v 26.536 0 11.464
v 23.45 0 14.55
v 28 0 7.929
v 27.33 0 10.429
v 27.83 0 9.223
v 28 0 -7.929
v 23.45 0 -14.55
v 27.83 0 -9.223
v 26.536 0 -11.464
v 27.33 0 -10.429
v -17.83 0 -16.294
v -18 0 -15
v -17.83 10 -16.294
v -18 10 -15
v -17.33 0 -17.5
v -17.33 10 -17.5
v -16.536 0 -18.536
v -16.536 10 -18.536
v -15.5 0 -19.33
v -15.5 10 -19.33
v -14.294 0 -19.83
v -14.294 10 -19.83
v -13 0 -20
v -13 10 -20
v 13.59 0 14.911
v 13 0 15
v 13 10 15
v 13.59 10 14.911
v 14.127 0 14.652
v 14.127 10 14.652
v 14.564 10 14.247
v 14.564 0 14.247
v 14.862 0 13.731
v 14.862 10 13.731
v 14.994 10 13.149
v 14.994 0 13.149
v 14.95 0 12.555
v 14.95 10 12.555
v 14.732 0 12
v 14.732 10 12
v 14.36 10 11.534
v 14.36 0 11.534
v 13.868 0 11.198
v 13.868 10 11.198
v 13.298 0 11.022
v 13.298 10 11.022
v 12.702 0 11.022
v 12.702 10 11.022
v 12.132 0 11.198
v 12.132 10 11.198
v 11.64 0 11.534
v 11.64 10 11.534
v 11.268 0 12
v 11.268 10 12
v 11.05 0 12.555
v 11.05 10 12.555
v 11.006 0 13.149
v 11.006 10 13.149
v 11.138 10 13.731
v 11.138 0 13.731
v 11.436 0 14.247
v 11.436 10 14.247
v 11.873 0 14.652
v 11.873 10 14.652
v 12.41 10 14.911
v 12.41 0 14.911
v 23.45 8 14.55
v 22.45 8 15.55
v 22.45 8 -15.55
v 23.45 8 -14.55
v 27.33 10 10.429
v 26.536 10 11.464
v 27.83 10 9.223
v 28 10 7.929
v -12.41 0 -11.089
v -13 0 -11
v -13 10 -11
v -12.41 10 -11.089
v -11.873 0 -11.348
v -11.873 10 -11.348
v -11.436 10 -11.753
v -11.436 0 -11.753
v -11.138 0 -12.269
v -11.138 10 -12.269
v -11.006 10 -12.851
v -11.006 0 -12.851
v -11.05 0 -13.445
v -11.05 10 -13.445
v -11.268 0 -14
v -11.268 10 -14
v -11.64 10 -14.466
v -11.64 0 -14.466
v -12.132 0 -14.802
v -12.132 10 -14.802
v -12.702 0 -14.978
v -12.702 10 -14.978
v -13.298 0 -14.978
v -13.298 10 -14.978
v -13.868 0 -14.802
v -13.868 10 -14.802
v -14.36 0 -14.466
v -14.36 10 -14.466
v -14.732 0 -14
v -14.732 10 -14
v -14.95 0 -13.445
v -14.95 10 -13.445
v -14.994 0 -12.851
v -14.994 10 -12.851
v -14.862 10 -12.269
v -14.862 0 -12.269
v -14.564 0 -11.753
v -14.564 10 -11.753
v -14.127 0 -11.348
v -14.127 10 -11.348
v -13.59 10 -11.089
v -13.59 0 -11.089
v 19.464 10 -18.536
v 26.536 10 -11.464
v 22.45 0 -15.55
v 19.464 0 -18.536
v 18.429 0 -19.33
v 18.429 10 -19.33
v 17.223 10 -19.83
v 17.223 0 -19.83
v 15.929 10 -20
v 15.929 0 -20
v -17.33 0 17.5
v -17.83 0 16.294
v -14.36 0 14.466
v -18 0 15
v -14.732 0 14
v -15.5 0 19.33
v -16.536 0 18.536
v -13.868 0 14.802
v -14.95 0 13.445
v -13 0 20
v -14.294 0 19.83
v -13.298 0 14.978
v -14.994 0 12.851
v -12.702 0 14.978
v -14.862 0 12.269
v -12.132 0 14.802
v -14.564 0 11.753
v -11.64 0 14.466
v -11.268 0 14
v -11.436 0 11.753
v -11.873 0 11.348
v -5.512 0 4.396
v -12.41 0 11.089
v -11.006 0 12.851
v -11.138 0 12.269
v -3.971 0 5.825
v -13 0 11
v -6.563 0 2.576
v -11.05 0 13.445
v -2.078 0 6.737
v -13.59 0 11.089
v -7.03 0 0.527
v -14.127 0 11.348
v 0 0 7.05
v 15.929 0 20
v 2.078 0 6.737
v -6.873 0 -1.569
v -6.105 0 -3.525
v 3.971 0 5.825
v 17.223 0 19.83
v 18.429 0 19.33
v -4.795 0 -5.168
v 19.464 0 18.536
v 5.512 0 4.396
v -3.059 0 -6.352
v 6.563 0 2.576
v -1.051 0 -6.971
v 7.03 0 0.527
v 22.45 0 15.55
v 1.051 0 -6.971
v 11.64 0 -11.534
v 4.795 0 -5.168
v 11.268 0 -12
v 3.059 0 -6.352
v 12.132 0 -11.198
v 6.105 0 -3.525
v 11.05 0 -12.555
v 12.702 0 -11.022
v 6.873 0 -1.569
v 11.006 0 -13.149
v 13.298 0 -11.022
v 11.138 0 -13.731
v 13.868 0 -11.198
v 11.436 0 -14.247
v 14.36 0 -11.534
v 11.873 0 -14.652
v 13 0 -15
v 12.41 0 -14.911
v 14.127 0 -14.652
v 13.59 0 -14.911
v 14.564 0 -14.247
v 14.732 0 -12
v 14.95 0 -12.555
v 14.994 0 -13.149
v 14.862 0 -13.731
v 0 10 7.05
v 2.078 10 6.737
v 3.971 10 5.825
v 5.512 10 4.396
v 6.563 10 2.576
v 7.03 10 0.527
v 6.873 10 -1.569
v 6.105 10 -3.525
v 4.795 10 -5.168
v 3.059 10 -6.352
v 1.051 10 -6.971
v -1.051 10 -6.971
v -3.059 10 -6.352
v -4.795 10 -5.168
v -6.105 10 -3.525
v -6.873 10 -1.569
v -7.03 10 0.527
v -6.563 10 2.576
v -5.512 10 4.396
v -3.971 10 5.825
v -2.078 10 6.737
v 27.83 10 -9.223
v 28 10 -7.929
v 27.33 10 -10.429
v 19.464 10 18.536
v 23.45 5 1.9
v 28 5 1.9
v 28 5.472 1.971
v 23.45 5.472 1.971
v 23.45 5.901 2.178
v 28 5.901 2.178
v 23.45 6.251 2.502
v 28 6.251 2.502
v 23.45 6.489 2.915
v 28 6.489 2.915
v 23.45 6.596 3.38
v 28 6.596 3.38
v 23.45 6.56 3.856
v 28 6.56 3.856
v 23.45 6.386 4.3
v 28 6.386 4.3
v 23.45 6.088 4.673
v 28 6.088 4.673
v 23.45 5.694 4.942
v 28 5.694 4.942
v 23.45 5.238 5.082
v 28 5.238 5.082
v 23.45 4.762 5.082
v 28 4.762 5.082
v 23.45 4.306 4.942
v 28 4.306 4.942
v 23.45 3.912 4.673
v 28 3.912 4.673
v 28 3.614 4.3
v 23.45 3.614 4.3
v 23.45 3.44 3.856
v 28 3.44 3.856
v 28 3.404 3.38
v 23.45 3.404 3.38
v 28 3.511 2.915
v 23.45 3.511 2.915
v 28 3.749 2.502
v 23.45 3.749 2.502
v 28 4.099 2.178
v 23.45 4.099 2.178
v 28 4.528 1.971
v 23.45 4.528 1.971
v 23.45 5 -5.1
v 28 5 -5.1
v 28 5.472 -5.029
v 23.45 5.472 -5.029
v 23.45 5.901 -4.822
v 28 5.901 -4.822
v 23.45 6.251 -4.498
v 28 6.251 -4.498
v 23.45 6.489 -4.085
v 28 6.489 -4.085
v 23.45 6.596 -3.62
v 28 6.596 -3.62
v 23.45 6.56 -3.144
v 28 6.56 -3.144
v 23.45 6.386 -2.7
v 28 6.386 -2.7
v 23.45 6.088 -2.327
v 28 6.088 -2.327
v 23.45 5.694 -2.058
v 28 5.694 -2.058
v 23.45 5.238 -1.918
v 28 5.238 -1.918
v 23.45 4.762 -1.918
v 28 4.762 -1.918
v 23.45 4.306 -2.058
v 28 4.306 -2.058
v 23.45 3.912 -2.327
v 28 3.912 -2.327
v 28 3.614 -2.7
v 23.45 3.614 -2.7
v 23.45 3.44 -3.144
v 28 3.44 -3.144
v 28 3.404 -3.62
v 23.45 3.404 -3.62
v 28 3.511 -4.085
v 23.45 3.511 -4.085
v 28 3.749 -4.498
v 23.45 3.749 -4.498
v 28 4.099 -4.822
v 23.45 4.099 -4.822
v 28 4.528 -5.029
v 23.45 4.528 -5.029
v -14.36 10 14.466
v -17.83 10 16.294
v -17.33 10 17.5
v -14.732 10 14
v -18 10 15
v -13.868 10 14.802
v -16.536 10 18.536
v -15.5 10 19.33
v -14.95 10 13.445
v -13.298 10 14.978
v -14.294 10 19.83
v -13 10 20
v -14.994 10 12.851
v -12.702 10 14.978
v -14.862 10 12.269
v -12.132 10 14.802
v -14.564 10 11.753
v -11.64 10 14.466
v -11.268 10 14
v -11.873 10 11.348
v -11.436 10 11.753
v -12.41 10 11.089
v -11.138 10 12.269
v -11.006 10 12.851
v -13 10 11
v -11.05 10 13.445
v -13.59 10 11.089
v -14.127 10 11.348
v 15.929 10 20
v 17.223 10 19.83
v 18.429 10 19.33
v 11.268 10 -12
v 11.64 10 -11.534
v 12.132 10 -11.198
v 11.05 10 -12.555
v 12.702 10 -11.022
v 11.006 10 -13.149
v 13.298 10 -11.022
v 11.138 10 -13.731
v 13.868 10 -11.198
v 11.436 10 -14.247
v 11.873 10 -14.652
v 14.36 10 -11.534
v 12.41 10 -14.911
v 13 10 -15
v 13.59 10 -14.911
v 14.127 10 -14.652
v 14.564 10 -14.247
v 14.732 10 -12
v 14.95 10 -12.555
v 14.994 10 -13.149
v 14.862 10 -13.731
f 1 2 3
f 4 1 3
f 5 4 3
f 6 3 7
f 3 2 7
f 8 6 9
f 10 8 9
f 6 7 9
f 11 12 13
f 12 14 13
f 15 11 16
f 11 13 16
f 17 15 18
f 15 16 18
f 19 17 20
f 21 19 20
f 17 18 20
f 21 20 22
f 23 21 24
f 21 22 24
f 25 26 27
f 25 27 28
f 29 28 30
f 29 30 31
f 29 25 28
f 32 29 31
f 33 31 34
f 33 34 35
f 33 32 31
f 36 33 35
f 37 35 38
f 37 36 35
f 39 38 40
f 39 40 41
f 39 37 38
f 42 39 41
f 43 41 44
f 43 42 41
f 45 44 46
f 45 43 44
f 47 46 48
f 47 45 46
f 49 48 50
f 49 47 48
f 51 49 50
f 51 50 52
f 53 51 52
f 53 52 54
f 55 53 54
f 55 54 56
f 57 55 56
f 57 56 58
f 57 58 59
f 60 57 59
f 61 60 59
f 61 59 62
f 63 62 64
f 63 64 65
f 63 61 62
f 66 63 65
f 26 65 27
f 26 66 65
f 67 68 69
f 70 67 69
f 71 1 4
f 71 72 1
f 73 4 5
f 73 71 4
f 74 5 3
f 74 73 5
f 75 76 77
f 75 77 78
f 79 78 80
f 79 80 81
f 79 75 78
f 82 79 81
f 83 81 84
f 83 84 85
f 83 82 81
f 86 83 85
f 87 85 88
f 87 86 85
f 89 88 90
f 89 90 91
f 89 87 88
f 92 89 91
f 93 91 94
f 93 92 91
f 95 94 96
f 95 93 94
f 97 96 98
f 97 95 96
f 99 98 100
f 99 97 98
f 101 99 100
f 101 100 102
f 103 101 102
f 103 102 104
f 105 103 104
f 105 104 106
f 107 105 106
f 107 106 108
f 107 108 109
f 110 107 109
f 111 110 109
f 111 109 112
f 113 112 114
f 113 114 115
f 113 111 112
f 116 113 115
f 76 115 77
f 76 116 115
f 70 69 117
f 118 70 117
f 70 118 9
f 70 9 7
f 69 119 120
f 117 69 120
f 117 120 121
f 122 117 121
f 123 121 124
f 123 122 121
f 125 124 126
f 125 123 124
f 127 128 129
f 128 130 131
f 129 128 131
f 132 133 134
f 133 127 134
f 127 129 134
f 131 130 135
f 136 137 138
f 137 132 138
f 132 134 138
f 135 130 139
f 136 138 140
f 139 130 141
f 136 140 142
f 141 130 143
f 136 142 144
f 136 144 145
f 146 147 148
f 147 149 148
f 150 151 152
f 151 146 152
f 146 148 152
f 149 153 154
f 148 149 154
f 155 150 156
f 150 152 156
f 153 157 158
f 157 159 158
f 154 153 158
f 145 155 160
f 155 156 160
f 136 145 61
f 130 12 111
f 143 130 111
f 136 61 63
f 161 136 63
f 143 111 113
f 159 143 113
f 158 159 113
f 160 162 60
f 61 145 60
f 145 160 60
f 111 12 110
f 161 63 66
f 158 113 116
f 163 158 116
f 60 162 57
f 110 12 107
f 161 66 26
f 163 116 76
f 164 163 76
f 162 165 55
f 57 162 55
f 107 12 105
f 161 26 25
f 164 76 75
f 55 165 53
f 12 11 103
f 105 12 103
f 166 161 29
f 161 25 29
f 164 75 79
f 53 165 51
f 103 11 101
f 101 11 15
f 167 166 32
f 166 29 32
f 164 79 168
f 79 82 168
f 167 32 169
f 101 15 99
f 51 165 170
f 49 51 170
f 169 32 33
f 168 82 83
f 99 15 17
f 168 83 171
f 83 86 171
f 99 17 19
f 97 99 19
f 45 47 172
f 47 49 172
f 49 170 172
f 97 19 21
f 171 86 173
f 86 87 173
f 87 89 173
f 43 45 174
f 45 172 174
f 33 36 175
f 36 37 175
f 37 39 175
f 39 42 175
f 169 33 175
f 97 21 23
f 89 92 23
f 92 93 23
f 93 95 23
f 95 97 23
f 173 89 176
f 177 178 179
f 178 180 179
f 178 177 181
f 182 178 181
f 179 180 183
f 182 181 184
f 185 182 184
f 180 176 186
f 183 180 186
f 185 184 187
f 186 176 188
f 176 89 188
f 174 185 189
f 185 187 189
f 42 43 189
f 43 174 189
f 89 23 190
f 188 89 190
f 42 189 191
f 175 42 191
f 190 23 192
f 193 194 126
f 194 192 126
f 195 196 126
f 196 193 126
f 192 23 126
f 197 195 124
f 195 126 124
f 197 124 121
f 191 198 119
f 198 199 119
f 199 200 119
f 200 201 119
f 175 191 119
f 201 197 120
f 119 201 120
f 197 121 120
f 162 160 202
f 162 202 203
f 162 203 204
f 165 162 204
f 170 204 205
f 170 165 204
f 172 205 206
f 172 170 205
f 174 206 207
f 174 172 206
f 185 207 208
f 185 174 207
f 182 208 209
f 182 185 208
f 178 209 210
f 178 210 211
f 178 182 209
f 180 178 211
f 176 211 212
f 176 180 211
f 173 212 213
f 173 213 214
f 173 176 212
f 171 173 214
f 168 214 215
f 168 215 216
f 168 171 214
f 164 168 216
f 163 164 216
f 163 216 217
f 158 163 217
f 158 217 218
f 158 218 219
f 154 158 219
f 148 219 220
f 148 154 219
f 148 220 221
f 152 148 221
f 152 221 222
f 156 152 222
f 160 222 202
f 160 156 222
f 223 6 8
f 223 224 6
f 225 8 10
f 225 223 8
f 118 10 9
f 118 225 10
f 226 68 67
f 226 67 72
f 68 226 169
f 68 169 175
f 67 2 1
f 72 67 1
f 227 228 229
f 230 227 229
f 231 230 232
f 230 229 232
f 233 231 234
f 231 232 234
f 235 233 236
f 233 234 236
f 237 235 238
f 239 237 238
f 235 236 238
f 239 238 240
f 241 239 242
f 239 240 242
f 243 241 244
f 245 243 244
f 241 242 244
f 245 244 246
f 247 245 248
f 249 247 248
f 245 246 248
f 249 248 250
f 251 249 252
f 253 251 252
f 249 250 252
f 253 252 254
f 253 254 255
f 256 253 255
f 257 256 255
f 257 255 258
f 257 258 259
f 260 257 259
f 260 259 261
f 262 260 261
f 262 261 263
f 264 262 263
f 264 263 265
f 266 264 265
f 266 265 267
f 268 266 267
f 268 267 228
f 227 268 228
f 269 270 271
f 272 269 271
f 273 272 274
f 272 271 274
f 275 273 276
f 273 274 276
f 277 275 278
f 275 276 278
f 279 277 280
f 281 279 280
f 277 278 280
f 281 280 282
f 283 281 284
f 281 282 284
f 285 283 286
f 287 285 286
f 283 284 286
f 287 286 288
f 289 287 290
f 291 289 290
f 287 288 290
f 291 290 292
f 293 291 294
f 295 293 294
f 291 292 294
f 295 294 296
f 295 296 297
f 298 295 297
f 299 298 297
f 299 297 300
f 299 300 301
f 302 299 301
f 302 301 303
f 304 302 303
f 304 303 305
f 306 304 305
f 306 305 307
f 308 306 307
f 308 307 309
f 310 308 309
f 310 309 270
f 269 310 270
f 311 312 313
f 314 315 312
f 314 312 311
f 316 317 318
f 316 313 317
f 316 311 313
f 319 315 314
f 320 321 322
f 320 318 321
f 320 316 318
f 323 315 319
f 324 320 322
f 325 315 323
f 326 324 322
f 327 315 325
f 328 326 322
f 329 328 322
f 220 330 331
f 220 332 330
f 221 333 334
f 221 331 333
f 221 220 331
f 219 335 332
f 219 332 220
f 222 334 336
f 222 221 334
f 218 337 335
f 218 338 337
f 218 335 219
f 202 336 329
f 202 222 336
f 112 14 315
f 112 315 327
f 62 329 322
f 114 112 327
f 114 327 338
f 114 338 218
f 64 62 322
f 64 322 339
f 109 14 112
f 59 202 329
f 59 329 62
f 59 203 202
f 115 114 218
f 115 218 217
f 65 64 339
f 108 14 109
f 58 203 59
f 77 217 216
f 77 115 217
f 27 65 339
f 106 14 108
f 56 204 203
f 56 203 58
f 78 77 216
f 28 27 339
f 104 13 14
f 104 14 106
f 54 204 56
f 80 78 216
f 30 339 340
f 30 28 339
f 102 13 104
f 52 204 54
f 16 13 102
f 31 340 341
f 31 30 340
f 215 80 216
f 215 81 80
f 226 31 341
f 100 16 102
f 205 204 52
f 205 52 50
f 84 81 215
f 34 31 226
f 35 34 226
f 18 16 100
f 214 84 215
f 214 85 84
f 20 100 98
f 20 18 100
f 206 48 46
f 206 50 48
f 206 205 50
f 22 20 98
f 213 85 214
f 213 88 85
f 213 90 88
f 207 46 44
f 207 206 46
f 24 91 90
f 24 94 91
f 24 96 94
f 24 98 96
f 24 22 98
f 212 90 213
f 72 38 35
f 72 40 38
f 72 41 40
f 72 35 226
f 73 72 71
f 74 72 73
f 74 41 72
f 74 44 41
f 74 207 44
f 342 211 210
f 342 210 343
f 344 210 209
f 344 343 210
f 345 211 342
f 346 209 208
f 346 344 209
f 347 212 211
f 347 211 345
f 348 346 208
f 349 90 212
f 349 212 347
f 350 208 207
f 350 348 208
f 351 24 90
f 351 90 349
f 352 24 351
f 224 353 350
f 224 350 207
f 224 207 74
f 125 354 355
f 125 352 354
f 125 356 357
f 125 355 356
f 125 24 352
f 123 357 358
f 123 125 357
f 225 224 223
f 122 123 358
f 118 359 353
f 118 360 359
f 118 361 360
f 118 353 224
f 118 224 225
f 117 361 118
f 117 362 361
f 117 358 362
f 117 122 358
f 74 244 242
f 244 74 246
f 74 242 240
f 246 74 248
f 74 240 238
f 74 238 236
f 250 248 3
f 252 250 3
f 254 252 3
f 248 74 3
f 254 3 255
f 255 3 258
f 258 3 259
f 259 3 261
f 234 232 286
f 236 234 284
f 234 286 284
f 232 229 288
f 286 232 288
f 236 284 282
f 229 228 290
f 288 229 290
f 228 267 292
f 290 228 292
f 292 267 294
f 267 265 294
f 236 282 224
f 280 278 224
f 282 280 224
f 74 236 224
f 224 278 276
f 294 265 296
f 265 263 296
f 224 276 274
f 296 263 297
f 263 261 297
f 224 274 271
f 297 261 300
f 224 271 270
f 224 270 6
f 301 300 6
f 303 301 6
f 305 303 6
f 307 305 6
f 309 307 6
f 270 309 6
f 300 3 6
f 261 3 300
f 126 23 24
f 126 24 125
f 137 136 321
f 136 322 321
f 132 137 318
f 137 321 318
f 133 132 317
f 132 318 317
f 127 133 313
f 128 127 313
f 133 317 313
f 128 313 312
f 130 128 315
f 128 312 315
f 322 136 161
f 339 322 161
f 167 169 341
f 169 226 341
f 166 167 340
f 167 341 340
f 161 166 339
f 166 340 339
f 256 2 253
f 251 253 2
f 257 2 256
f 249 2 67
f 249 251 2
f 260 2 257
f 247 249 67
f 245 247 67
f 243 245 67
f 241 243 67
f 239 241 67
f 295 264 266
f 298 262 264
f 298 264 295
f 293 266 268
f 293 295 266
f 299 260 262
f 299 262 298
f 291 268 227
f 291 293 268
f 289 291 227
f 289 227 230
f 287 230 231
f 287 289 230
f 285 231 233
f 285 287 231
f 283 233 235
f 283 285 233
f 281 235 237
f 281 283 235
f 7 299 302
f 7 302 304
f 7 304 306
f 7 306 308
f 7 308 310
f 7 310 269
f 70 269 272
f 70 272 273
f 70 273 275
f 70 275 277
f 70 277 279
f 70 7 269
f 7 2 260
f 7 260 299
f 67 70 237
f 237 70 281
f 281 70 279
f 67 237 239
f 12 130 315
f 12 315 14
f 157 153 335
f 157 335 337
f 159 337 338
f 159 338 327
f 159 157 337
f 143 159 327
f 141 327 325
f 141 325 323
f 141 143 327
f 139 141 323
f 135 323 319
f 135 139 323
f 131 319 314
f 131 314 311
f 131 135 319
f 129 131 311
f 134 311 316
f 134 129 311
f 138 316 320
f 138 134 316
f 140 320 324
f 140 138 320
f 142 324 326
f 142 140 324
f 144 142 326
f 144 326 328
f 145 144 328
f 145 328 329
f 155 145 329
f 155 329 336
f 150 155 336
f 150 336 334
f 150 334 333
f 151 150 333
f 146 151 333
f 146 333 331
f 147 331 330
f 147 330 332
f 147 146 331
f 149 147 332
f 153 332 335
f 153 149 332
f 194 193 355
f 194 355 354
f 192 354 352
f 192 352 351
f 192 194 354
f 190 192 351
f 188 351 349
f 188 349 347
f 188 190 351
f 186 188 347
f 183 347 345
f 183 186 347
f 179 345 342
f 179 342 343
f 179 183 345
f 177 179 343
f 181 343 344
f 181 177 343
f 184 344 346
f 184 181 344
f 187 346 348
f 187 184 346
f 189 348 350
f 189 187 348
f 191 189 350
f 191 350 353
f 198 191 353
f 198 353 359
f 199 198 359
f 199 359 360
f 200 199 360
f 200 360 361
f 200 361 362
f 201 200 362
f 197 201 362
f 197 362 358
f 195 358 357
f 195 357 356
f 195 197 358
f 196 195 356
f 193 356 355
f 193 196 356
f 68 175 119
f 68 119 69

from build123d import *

# Parameters (mm, degrees)
SKETCH1_W               = 36
SKETCH1_H               = 40
SKETCH1_R               = 2
SKETCH1_R_2             = 7.05
BOSS_EXTRUDE1_DEPTH     = 10
BOSS_EXTRUDE2_DEPTH     = 10
FILLET1_R               = 5
CUT_EXTRUDE1_DEPTH      = 36.832945734
CUT_EXTRUDE1_DEPTH_BACK = 36.832945734
SKETCH4_W               = 1
SKETCH4_H               = 8
CUT_EXTRUDE2_REACH      = 53.147
SKETCH5_R               = 1.6


with BuildPart() as part:
    # Sketch1 → Boss-Extrude1 (new body)
    with BuildSketch(Plane(origin=(0, 0, 0), x_dir=(1, 0, 0), z_dir=(0, 1, 0))):
        Rectangle(SKETCH1_W, SKETCH1_H)
        with Locations(Location((-13, 13, 0), (0, 0, 270))):
            Circle(SKETCH1_R, mode=Mode.SUBTRACT)
        with Locations(Location((13, 13, 0), (0, 0, 90))):
            Circle(SKETCH1_R, mode=Mode.SUBTRACT)
        with Locations(Location((-13, -13, 0), (0, 0, 90))):
            Circle(SKETCH1_R, mode=Mode.SUBTRACT)
        with Locations(Location((13, -13, 0), (0, 0, 270))):
            Circle(SKETCH1_R, mode=Mode.SUBTRACT)
        with Locations(Location((0, 0, 0), (0, 0, 270))):
            Circle(SKETCH1_R_2, mode=Mode.SUBTRACT)
    extrude(amount=BOSS_EXTRUDE1_DEPTH)

    # Sketch3 → Boss-Extrude2 (add)
    with BuildSketch(Plane(origin=(0, 0, 0), x_dir=(1, 0, 0), z_dir=(0, 1, 0))):
        Polygon((18, 20), (18, -20), (28, -10), (28, 10), align=None)
    extrude(amount=BOSS_EXTRUDE2_DEPTH)

    # Fillet1
    fillet1_edges = [part.edges().sort_by_distance(p)[0] for p in [
        (28, 5, 10),
        (28, 5, -10),
        (18, 5, 20),
        (-18, 5, 20),
        (-18, 5, -20),
        (18, 5, -20),
    ]]
    fillet(fillet1_edges, radius=FILLET1_R)

    # Sketch4 → Cut-Extrude1 (cut, two sides: drawn at the far end of the back side and taken through both)
    with BuildSketch(Plane.XY.offset(-CUT_EXTRUDE1_DEPTH_BACK)):
        with Locations((22.95, 4)):
            Rectangle(SKETCH4_W, SKETCH4_H)
    extrude(amount=CUT_EXTRUDE1_DEPTH + CUT_EXTRUDE1_DEPTH_BACK, mode=Mode.SUBTRACT)

    # Sketch5 → Cut-Extrude2 (cut, up to next)
    with BuildSketch(Plane(origin=(28, 0, 0), x_dir=(0, 0, -1), z_dir=(1, 0, 0)), mode=Mode.PRIVATE) as cut_extrude2_sk1:
        with Locations((-3.5, 5)):
            Circle(SKETCH5_R)
    cut_extrude2_tool1 = extrude(cut_extrude2_sk1.sketch, amount=-CUT_EXTRUDE2_REACH, mode=Mode.PRIVATE) & part.part
    # Sketch5 → Cut-Extrude2 (cut, up to next)
    with BuildSketch(Plane(origin=(28, 0, 0), x_dir=(0, 0, -1), z_dir=(1, 0, 0)), mode=Mode.PRIVATE) as cut_extrude2_sk2:
        with Locations((3.5, 5)):
            Circle(SKETCH5_R)
    cut_extrude2_tool2 = extrude(cut_extrude2_sk2.sketch, amount=-CUT_EXTRUDE2_REACH, mode=Mode.PRIVATE) & part.part
    add(cut_extrude2_tool1.solids().sort_by_distance((28, 5, 3.5))[0], mode=Mode.SUBTRACT)
    add(cut_extrude2_tool2.solids().sort_by_distance((28, 5, -3.5))[0], mode=Mode.SUBTRACT)


solid = part.part
